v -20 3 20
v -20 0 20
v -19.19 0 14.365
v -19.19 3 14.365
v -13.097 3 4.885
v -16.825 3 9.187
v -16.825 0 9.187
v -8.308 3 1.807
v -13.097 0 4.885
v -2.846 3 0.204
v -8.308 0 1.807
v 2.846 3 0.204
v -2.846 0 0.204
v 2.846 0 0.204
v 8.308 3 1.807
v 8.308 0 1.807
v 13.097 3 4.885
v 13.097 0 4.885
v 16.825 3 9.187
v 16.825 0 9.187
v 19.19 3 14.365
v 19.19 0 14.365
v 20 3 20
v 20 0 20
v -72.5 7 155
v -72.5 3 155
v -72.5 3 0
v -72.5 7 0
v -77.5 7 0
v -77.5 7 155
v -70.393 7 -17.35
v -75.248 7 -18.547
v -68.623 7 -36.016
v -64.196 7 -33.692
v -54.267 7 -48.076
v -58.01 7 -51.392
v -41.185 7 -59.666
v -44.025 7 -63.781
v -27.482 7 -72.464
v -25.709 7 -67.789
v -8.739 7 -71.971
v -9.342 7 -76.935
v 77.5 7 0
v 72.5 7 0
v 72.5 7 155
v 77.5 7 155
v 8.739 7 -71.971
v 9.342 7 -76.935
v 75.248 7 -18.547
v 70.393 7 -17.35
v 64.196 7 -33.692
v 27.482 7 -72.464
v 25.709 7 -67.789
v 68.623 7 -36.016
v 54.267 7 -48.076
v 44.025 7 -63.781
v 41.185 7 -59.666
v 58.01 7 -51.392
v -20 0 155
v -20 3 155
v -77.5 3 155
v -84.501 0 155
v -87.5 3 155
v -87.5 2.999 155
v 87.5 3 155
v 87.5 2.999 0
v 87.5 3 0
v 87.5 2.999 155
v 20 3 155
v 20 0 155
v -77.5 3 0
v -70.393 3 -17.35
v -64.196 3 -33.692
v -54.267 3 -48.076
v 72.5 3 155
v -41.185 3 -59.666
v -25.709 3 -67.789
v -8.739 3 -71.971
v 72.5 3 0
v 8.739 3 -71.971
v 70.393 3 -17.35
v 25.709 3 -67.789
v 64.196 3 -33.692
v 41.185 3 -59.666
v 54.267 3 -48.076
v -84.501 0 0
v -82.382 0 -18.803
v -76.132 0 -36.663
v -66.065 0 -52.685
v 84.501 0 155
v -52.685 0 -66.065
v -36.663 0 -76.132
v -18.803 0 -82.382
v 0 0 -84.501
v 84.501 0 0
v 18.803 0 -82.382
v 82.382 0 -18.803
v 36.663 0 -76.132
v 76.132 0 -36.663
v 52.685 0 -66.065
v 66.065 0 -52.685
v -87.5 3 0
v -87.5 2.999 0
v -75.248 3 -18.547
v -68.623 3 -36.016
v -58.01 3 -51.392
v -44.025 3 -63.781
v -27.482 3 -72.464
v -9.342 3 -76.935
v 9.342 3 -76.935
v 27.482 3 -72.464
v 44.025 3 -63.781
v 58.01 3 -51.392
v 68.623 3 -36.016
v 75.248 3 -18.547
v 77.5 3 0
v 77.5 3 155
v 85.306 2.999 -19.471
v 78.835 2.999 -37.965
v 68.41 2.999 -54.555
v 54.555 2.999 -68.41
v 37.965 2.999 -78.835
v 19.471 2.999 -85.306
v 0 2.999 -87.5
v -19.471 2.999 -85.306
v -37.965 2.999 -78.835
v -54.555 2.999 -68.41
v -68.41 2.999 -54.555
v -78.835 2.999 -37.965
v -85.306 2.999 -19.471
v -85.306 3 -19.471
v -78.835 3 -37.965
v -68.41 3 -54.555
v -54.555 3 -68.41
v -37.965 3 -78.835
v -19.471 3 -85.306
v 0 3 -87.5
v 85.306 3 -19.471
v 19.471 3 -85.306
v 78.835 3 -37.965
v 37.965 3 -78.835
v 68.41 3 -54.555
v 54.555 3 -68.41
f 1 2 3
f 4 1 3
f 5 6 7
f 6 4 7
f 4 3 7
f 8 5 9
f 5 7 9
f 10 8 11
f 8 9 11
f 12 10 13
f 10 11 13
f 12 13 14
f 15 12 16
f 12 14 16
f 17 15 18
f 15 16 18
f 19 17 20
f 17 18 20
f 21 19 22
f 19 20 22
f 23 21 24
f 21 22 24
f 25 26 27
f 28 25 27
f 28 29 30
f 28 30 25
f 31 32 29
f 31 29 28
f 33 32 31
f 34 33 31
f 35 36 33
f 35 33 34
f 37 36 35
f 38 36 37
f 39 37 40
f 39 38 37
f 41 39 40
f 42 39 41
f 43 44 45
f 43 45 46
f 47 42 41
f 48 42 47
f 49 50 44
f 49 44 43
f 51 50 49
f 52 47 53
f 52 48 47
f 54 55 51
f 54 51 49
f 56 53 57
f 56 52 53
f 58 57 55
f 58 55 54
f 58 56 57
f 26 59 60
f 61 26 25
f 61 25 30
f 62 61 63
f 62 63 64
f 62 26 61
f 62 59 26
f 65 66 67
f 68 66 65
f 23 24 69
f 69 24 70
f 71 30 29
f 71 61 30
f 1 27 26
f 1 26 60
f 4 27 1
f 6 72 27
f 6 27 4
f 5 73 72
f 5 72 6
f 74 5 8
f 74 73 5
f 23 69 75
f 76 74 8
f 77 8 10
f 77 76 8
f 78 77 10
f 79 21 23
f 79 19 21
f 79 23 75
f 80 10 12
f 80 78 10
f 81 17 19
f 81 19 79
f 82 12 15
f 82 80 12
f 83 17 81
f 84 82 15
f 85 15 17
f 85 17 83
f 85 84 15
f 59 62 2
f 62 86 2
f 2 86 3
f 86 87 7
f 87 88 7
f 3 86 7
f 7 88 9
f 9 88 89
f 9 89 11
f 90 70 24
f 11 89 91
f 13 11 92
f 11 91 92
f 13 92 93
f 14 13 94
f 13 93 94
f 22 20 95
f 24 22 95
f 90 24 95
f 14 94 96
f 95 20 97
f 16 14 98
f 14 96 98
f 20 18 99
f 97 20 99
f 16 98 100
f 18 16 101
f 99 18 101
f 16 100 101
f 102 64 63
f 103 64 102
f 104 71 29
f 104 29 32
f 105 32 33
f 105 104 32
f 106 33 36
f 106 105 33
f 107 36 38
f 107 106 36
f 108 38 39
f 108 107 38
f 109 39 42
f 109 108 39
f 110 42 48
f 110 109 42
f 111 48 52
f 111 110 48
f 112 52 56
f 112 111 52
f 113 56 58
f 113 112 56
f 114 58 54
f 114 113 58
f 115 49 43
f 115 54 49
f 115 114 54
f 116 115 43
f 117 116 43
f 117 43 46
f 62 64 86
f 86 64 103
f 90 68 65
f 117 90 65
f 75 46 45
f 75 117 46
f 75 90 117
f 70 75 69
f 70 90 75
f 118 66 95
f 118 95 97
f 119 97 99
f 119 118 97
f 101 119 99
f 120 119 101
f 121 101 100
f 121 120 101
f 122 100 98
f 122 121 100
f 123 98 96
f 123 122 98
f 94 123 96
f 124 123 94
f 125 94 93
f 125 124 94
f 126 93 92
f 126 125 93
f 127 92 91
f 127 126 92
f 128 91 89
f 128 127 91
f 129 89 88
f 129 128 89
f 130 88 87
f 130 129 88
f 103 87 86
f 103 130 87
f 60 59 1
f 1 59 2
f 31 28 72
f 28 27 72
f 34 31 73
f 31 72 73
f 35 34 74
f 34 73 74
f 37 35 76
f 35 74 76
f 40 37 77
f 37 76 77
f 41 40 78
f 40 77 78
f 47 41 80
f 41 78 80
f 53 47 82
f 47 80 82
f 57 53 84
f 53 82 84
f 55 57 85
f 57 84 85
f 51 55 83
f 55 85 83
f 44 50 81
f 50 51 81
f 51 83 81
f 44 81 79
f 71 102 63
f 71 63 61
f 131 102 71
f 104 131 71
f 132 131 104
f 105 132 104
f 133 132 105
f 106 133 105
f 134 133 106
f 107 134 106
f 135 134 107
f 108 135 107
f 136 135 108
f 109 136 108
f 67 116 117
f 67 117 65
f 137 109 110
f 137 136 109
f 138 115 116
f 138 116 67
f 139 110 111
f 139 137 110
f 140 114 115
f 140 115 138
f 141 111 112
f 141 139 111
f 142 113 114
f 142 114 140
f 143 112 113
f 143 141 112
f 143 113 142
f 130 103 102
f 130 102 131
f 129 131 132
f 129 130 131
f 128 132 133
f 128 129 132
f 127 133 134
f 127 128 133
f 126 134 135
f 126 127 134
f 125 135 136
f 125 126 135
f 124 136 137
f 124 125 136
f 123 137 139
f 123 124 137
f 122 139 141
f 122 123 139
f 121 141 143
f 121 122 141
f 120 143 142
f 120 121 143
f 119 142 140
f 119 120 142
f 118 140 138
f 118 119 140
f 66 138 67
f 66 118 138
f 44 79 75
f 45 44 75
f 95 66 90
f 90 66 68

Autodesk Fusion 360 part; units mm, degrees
sketch "Sketch1" plane through (0, 0, 0) normal (0, 1, 0) x (1, 0, 0)
  line L0 (0, 0) -> (0, -155)
  line L1 (-77.5, 0) -> (77.5, 0)
  line L2 (77.5, 0) -> (77.5, -155)
  line L3 (77.5, -155) -> (-77.5, -155)
  line L4 (-77.5, -155) -> (-77.5, 0)
  arc A0 (77.5, 0) -> (-77.5, 0) centre (0, 0) ccw
  line L5 (-20, -155) -> (-20, 0)
  arc A1 (20, 0) -> (-20, 0) centre (0, 0) ccw
  line L6 (20, 0) -> (20, -155)
  line L7 (-87.5, -155) -> (-87.5, 0)
  arc A2 (87.5, 0) -> (-87.5, 0) centre (0, 0) ccw
  line L8 (87.5, 0) -> (87.5, -155)
  line L9 (87.5, -155) -> (-87.5, -155)
  line L10 (-72.5, -155) -> (-72.5, 0)
  arc A3 (72.5, 0) -> (-72.5, 0) centre (0, 0) ccw
  line L11 (72.5, 0) -> (72.5, -155)
  line L12 (20, -20) -> (-20, -20)
  arc A4 (20, -20) -> (-20, -20) centre (0, -20) ccw
  dimension "d2" = 155
  dimension "d3" = 155
  dimension "d4" = 57.5
  dimension "d5" = -10
  dimension "d6" = 5
extrude "Extrude1" add sketch "Sketch1" along normal blind 7 contours L1 L3 L4 L9 L10 | L1 A0 A3 | L1 L2 L3 L9 L11
extrude "Extrude2" add sketch "Sketch1" along normal blind 3 contours L1 L5 A4 | L1 A1 | L1 L6 A4 | L1 L3 L5 L9 L10 | L1 A1 A3 | L1 L3 L6 L9 L11 | L2 L4 A0 L7 A2 L8 L9
chamfer "Chamfer1" distance 3 angle 45 3 edges at (87.5, 0, 77.5) (0, 0, -87.5) (-87.5, 0, 77.5)
equation "d2 = 245 mm - 90 mm"
equation "d4 = ( ( 155 - 40 ) / 2 ) * 1 mm"
